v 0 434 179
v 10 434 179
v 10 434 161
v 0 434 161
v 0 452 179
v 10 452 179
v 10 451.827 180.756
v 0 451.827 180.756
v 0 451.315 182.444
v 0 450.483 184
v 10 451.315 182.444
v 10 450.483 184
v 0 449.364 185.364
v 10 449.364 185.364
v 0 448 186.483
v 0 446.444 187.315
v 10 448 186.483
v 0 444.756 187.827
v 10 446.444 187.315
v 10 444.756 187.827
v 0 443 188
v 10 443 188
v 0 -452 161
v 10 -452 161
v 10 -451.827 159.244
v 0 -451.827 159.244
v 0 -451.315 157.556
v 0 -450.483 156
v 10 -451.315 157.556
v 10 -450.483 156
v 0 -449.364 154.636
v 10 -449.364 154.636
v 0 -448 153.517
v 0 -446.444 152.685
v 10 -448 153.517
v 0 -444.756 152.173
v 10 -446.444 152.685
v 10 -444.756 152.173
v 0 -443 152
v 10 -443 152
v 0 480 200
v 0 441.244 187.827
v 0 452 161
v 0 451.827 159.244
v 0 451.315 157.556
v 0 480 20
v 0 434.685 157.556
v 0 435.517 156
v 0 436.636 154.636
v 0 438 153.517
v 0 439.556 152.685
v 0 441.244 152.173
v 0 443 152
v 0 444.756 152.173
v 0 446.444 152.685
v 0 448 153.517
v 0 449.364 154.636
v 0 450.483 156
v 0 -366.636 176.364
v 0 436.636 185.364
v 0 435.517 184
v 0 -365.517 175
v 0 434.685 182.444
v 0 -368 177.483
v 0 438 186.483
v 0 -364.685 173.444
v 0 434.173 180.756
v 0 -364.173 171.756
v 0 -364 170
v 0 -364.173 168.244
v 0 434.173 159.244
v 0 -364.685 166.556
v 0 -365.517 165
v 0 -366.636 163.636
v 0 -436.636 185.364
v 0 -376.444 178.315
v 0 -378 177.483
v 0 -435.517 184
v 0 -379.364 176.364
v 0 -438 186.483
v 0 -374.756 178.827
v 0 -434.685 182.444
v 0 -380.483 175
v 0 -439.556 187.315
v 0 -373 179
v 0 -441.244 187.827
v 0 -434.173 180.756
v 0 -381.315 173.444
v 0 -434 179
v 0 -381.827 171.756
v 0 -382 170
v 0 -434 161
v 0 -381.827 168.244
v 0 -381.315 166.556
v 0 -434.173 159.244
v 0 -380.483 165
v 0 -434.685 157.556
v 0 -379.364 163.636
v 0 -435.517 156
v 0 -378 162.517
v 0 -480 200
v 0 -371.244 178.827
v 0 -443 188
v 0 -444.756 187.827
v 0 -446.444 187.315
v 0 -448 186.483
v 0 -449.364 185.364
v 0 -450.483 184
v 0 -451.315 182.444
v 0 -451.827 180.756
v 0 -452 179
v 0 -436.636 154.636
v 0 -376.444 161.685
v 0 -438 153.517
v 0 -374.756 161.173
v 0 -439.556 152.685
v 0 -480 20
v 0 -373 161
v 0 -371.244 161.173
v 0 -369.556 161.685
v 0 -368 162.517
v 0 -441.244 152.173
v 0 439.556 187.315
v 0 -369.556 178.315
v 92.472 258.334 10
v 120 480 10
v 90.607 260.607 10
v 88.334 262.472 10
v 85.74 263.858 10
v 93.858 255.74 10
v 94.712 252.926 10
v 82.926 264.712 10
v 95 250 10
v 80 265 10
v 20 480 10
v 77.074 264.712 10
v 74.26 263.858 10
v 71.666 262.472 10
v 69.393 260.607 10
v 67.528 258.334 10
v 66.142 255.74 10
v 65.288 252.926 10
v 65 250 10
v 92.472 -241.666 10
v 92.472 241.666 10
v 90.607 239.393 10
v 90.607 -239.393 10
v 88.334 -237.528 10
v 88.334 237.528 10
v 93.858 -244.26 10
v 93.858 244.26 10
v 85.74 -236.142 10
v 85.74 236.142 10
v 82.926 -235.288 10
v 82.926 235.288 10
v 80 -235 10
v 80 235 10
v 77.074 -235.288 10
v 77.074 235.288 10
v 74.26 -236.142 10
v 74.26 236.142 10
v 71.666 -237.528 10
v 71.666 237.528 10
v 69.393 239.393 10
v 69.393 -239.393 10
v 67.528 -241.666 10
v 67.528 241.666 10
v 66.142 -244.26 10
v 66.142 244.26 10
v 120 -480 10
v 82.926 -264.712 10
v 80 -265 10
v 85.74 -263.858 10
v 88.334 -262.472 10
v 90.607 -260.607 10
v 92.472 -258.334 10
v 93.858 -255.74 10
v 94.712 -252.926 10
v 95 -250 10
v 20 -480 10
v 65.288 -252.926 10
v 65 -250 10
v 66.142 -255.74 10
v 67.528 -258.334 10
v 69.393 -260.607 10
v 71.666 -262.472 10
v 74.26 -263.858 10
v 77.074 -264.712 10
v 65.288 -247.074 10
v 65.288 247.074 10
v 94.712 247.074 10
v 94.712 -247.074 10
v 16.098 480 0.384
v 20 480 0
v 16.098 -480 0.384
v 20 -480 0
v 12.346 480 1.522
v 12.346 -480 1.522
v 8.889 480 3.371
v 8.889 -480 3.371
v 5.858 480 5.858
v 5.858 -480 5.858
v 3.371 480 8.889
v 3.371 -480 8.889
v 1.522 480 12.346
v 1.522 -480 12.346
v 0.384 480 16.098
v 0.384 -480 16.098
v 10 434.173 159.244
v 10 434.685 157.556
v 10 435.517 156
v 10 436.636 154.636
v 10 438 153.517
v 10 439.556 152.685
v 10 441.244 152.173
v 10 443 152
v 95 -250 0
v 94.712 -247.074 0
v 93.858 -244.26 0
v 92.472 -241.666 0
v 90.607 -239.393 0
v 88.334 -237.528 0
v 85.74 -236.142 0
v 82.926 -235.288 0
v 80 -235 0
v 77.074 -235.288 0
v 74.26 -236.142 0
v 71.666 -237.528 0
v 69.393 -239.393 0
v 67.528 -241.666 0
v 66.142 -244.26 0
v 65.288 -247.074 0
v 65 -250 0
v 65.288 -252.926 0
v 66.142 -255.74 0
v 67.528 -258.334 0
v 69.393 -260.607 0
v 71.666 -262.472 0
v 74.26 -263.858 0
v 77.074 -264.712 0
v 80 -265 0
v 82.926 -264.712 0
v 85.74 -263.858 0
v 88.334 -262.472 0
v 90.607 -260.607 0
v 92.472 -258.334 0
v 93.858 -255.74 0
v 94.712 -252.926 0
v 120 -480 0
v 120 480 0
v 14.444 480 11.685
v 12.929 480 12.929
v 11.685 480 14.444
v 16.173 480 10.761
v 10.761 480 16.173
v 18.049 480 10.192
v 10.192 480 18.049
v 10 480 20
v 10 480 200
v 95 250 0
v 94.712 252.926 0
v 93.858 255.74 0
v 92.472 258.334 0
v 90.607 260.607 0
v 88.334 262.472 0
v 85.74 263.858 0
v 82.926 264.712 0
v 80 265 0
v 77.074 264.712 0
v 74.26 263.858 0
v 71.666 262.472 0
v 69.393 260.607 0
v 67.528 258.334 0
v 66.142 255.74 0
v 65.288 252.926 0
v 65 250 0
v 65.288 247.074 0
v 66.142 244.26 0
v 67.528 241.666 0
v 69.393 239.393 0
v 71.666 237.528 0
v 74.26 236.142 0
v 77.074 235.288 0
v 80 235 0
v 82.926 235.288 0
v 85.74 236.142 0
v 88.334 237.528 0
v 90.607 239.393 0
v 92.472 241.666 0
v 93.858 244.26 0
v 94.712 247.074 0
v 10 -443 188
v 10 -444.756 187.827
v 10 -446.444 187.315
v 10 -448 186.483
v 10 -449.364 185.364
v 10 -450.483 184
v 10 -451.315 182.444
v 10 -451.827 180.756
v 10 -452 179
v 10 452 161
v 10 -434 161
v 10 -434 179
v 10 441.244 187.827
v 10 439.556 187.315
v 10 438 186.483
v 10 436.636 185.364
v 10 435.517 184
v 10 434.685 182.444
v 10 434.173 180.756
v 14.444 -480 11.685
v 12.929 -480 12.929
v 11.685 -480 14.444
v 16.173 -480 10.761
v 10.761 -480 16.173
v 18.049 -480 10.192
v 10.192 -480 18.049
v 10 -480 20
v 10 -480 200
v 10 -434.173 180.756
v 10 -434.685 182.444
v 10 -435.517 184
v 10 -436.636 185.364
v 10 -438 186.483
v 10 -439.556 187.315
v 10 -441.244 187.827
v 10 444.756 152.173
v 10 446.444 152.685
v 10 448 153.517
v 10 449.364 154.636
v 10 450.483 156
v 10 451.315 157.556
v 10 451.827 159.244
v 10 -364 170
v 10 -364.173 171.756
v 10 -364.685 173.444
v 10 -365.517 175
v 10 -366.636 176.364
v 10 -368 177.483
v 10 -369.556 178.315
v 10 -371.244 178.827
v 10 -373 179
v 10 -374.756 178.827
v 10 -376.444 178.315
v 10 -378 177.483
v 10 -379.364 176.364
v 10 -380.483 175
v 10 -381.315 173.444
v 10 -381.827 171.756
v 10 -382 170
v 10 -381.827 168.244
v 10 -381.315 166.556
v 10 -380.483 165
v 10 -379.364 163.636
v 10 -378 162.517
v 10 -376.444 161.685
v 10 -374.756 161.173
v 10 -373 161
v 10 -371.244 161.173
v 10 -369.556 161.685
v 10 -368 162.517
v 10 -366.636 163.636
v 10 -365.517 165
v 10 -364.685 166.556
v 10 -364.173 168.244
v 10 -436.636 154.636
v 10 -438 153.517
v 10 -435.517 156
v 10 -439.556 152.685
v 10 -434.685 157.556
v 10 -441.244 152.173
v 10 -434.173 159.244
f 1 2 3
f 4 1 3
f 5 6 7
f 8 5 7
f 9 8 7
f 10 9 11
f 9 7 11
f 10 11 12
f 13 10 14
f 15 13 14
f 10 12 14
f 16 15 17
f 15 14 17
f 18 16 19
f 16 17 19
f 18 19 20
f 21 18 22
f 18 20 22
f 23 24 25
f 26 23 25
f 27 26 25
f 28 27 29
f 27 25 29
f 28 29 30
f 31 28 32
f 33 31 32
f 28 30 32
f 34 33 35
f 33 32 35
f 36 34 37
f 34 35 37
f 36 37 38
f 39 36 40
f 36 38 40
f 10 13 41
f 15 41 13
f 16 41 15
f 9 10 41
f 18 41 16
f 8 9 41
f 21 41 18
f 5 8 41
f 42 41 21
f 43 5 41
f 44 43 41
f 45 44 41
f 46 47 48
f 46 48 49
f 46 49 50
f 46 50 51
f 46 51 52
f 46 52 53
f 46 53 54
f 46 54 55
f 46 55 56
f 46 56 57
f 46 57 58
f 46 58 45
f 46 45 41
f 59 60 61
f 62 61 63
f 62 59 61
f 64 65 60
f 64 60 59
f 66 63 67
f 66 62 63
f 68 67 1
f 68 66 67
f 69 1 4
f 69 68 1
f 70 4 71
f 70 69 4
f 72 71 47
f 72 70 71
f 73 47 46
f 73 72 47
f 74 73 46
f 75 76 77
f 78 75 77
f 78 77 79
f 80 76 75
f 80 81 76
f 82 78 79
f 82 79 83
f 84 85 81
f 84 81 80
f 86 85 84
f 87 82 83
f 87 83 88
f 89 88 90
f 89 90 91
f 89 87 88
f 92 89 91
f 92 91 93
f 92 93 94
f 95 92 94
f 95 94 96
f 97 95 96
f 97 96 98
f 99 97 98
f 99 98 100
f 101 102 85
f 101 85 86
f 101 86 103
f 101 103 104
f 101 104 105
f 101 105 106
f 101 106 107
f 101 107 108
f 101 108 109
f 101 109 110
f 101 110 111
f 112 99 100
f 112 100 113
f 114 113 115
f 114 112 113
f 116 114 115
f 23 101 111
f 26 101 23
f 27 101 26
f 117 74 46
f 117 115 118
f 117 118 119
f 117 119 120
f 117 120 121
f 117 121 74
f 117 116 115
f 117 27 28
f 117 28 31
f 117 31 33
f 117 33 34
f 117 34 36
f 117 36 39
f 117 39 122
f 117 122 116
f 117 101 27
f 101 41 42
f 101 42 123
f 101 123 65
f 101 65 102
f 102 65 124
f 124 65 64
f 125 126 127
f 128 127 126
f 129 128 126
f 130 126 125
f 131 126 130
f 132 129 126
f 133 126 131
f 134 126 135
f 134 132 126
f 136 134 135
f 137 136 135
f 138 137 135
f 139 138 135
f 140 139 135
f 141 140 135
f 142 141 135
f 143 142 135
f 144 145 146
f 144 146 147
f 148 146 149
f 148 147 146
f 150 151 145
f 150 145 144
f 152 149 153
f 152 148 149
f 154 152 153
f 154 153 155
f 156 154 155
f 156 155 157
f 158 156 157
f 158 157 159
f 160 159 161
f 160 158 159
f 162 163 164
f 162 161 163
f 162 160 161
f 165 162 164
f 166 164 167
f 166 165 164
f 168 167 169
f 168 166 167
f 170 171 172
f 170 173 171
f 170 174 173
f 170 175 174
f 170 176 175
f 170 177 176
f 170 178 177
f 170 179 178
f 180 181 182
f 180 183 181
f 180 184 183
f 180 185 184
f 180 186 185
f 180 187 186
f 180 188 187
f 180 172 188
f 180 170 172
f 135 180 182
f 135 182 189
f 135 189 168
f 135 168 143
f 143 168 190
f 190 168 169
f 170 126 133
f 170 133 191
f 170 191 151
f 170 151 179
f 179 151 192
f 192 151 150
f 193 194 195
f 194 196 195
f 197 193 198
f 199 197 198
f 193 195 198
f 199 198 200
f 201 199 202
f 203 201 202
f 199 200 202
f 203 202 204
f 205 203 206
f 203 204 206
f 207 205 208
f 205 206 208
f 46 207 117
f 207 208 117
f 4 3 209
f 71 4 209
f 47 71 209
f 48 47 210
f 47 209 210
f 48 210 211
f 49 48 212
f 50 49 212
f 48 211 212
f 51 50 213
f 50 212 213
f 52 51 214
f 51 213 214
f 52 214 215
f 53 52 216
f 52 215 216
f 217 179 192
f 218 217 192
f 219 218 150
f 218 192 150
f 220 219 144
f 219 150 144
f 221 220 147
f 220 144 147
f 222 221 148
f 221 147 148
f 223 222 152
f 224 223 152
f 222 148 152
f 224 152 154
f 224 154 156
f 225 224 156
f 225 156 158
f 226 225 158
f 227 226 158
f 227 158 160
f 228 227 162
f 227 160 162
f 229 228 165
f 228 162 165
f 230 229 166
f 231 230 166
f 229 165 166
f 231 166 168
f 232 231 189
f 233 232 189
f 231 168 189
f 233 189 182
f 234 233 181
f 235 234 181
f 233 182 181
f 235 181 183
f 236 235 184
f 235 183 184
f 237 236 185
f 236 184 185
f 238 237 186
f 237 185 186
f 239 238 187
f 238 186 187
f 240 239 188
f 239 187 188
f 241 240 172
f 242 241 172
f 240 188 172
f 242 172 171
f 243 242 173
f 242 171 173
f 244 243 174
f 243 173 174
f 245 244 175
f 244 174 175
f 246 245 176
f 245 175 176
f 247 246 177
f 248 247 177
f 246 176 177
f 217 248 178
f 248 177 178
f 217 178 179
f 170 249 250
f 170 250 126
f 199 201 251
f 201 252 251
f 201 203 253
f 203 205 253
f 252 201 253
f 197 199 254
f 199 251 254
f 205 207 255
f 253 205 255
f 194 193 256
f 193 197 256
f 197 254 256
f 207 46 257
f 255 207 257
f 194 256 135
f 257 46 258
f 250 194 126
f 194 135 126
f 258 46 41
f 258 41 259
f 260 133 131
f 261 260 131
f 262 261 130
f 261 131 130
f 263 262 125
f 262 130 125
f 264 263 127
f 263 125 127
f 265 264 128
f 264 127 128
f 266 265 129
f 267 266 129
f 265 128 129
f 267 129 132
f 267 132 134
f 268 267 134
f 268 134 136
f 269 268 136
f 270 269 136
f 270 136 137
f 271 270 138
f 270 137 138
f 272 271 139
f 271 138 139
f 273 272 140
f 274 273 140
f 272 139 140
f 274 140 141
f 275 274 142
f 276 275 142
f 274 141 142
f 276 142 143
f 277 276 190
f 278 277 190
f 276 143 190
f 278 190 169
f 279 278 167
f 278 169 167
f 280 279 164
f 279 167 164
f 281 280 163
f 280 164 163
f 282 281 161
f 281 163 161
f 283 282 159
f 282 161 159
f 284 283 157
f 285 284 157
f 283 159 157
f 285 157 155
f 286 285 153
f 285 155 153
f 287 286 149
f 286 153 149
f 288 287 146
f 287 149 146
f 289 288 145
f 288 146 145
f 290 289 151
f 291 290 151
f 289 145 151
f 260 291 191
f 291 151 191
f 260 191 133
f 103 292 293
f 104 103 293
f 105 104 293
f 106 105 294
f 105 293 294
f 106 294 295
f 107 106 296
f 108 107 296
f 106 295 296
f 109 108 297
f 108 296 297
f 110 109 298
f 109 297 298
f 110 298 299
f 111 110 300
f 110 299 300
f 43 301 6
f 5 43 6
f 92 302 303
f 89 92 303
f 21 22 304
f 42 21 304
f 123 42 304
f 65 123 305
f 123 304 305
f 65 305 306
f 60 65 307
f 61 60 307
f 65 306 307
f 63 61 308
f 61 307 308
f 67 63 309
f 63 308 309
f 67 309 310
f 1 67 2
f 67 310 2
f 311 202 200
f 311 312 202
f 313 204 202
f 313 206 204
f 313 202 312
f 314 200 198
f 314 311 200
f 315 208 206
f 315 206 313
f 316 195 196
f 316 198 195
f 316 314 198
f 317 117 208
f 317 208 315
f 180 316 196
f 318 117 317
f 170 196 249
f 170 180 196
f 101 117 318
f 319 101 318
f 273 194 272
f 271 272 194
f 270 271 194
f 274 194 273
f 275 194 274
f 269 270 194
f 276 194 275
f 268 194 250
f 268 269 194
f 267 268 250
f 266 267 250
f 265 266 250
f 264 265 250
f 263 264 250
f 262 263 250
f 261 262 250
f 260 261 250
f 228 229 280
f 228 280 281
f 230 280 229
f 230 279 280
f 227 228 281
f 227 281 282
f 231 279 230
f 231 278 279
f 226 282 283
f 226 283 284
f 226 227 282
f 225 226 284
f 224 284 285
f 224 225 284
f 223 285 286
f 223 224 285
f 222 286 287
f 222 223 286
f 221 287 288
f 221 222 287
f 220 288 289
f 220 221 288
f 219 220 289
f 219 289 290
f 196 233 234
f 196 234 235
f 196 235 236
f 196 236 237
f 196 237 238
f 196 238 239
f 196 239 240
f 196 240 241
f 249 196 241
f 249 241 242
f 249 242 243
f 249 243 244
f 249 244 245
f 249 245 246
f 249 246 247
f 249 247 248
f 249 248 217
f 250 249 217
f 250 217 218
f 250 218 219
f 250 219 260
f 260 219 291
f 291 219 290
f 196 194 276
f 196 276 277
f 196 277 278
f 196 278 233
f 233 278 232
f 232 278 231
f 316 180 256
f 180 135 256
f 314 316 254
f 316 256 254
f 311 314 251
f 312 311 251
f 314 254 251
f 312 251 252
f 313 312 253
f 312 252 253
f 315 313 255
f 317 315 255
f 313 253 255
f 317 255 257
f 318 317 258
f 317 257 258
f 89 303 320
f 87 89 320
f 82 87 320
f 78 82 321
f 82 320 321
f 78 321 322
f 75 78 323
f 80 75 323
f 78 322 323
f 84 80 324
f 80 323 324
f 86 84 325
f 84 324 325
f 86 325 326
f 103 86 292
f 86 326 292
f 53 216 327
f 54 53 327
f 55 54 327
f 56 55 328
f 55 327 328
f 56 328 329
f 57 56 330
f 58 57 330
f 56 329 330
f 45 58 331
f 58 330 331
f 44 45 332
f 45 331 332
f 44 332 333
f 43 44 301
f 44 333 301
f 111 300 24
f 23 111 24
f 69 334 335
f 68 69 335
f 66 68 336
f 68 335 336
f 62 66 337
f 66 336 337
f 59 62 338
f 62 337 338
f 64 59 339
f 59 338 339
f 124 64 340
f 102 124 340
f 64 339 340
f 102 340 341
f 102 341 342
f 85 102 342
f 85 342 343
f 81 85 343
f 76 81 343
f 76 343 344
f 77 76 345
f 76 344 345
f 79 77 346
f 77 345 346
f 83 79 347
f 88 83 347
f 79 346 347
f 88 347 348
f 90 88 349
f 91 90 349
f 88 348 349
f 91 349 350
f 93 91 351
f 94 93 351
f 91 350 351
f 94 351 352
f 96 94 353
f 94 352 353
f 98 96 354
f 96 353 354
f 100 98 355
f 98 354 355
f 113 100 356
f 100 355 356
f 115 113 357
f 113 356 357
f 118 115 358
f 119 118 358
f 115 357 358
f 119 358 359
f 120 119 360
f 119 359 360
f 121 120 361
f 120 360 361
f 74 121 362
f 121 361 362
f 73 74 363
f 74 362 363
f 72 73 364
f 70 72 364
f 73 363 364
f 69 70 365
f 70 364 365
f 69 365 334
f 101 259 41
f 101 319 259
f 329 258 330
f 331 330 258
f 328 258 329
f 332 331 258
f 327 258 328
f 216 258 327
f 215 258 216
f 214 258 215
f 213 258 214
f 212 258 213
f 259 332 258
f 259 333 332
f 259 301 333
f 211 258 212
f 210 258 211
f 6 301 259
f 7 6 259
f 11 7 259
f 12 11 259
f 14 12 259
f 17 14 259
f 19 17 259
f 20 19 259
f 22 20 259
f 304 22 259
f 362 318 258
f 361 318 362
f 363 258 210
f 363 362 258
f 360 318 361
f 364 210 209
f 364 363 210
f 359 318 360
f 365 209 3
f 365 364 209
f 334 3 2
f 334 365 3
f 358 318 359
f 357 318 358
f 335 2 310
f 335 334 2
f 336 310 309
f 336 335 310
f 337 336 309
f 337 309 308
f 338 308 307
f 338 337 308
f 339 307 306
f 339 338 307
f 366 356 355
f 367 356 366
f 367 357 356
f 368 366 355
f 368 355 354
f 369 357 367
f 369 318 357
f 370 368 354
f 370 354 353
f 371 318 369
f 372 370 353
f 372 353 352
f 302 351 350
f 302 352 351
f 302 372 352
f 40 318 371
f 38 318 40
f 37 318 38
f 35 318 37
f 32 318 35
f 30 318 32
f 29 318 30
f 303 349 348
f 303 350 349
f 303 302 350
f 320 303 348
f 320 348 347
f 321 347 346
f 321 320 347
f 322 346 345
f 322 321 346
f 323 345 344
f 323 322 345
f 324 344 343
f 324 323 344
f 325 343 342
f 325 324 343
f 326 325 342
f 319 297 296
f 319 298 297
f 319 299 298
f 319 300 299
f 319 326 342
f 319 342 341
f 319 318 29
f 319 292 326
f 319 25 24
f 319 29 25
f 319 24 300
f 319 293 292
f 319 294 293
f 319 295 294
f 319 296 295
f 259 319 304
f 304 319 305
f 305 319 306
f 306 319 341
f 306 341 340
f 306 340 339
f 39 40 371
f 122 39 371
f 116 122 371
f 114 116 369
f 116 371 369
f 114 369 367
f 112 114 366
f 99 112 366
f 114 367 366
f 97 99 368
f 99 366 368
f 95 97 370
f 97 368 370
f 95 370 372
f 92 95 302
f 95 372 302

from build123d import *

# Parameters (mm, degrees)
F1_DEPTH = 480
F2_R     = 9
F3_DEPTH = 10
F4_R     = 15
F5_DEPTH = 10
F6_R     = 10
F7_R     = 20


with BuildPart() as f1:
    # F0 (on Front) → F1 (new body, symmetric)
    with BuildSketch(Plane.XZ):
        Polygon((0, 200), (0, 0), (120, 0), (120, 10), (10, 10), (10, 200), align=None)
    extrude(amount=F1_DEPTH, both=True)

    # F2 (on face) → F3 (cut, through all)
    with BuildSketch(Plane.YZ.offset(10)):
        with Locations((-373, 170)):
            Circle(F2_R)
        with BuildLine():
            ThreePointArc((-434, 179), (-436.6360389693, 185.3639610307), (-443, 188))
            ThreePointArc((-443, 188), (-449.3639610307, 185.3639610307), (-452, 179))
            Line((-452, 179), (-452, 161))
            ThreePointArc((-452, 161), (-449.3639610307, 154.6360389693), (-443, 152))
            ThreePointArc((-443, 152), (-436.6360389693, 154.6360389693), (-434, 161))
            Line((-434, 161), (-434, 179))
        make_face()
        with BuildLine():
            ThreePointArc((443, 188), (436.6360389693, 185.3639610307), (434, 179))
            Line((434, 179), (434, 161))
            ThreePointArc((434, 161), (436.6360389693, 154.6360389693), (443, 152))
            ThreePointArc((443, 152), (449.3639610307, 154.6360389693), (452, 161))
            Line((452, 161), (452, 179))
            ThreePointArc((452, 179), (449.3639610307, 185.3639610307), (443, 188))
        make_face()
    extrude(amount=-F3_DEPTH, mode=Mode.SUBTRACT)

    # F4 (on face) → F5 (cut, through all)
    with BuildSketch(Plane.XY.offset(10)):
        with Locations((80, -250)):
            Circle(F4_R)
        with Locations((80, 250)):
            Circle(F4_R)
    extrude(amount=-F5_DEPTH, mode=Mode.SUBTRACT)

    # F6
    f6_edges = [f1.edges().sort_by_distance(p)[0] for p in [
        (10, 0, 10),
    ]]
    fillet(f6_edges, radius=F6_R)

    # F7
    f7_edges = [f1.edges().sort_by_distance(p)[0] for p in [
        (0, 0, 0),
    ]]
    fillet(f7_edges, radius=F7_R)


solid = f1.part
